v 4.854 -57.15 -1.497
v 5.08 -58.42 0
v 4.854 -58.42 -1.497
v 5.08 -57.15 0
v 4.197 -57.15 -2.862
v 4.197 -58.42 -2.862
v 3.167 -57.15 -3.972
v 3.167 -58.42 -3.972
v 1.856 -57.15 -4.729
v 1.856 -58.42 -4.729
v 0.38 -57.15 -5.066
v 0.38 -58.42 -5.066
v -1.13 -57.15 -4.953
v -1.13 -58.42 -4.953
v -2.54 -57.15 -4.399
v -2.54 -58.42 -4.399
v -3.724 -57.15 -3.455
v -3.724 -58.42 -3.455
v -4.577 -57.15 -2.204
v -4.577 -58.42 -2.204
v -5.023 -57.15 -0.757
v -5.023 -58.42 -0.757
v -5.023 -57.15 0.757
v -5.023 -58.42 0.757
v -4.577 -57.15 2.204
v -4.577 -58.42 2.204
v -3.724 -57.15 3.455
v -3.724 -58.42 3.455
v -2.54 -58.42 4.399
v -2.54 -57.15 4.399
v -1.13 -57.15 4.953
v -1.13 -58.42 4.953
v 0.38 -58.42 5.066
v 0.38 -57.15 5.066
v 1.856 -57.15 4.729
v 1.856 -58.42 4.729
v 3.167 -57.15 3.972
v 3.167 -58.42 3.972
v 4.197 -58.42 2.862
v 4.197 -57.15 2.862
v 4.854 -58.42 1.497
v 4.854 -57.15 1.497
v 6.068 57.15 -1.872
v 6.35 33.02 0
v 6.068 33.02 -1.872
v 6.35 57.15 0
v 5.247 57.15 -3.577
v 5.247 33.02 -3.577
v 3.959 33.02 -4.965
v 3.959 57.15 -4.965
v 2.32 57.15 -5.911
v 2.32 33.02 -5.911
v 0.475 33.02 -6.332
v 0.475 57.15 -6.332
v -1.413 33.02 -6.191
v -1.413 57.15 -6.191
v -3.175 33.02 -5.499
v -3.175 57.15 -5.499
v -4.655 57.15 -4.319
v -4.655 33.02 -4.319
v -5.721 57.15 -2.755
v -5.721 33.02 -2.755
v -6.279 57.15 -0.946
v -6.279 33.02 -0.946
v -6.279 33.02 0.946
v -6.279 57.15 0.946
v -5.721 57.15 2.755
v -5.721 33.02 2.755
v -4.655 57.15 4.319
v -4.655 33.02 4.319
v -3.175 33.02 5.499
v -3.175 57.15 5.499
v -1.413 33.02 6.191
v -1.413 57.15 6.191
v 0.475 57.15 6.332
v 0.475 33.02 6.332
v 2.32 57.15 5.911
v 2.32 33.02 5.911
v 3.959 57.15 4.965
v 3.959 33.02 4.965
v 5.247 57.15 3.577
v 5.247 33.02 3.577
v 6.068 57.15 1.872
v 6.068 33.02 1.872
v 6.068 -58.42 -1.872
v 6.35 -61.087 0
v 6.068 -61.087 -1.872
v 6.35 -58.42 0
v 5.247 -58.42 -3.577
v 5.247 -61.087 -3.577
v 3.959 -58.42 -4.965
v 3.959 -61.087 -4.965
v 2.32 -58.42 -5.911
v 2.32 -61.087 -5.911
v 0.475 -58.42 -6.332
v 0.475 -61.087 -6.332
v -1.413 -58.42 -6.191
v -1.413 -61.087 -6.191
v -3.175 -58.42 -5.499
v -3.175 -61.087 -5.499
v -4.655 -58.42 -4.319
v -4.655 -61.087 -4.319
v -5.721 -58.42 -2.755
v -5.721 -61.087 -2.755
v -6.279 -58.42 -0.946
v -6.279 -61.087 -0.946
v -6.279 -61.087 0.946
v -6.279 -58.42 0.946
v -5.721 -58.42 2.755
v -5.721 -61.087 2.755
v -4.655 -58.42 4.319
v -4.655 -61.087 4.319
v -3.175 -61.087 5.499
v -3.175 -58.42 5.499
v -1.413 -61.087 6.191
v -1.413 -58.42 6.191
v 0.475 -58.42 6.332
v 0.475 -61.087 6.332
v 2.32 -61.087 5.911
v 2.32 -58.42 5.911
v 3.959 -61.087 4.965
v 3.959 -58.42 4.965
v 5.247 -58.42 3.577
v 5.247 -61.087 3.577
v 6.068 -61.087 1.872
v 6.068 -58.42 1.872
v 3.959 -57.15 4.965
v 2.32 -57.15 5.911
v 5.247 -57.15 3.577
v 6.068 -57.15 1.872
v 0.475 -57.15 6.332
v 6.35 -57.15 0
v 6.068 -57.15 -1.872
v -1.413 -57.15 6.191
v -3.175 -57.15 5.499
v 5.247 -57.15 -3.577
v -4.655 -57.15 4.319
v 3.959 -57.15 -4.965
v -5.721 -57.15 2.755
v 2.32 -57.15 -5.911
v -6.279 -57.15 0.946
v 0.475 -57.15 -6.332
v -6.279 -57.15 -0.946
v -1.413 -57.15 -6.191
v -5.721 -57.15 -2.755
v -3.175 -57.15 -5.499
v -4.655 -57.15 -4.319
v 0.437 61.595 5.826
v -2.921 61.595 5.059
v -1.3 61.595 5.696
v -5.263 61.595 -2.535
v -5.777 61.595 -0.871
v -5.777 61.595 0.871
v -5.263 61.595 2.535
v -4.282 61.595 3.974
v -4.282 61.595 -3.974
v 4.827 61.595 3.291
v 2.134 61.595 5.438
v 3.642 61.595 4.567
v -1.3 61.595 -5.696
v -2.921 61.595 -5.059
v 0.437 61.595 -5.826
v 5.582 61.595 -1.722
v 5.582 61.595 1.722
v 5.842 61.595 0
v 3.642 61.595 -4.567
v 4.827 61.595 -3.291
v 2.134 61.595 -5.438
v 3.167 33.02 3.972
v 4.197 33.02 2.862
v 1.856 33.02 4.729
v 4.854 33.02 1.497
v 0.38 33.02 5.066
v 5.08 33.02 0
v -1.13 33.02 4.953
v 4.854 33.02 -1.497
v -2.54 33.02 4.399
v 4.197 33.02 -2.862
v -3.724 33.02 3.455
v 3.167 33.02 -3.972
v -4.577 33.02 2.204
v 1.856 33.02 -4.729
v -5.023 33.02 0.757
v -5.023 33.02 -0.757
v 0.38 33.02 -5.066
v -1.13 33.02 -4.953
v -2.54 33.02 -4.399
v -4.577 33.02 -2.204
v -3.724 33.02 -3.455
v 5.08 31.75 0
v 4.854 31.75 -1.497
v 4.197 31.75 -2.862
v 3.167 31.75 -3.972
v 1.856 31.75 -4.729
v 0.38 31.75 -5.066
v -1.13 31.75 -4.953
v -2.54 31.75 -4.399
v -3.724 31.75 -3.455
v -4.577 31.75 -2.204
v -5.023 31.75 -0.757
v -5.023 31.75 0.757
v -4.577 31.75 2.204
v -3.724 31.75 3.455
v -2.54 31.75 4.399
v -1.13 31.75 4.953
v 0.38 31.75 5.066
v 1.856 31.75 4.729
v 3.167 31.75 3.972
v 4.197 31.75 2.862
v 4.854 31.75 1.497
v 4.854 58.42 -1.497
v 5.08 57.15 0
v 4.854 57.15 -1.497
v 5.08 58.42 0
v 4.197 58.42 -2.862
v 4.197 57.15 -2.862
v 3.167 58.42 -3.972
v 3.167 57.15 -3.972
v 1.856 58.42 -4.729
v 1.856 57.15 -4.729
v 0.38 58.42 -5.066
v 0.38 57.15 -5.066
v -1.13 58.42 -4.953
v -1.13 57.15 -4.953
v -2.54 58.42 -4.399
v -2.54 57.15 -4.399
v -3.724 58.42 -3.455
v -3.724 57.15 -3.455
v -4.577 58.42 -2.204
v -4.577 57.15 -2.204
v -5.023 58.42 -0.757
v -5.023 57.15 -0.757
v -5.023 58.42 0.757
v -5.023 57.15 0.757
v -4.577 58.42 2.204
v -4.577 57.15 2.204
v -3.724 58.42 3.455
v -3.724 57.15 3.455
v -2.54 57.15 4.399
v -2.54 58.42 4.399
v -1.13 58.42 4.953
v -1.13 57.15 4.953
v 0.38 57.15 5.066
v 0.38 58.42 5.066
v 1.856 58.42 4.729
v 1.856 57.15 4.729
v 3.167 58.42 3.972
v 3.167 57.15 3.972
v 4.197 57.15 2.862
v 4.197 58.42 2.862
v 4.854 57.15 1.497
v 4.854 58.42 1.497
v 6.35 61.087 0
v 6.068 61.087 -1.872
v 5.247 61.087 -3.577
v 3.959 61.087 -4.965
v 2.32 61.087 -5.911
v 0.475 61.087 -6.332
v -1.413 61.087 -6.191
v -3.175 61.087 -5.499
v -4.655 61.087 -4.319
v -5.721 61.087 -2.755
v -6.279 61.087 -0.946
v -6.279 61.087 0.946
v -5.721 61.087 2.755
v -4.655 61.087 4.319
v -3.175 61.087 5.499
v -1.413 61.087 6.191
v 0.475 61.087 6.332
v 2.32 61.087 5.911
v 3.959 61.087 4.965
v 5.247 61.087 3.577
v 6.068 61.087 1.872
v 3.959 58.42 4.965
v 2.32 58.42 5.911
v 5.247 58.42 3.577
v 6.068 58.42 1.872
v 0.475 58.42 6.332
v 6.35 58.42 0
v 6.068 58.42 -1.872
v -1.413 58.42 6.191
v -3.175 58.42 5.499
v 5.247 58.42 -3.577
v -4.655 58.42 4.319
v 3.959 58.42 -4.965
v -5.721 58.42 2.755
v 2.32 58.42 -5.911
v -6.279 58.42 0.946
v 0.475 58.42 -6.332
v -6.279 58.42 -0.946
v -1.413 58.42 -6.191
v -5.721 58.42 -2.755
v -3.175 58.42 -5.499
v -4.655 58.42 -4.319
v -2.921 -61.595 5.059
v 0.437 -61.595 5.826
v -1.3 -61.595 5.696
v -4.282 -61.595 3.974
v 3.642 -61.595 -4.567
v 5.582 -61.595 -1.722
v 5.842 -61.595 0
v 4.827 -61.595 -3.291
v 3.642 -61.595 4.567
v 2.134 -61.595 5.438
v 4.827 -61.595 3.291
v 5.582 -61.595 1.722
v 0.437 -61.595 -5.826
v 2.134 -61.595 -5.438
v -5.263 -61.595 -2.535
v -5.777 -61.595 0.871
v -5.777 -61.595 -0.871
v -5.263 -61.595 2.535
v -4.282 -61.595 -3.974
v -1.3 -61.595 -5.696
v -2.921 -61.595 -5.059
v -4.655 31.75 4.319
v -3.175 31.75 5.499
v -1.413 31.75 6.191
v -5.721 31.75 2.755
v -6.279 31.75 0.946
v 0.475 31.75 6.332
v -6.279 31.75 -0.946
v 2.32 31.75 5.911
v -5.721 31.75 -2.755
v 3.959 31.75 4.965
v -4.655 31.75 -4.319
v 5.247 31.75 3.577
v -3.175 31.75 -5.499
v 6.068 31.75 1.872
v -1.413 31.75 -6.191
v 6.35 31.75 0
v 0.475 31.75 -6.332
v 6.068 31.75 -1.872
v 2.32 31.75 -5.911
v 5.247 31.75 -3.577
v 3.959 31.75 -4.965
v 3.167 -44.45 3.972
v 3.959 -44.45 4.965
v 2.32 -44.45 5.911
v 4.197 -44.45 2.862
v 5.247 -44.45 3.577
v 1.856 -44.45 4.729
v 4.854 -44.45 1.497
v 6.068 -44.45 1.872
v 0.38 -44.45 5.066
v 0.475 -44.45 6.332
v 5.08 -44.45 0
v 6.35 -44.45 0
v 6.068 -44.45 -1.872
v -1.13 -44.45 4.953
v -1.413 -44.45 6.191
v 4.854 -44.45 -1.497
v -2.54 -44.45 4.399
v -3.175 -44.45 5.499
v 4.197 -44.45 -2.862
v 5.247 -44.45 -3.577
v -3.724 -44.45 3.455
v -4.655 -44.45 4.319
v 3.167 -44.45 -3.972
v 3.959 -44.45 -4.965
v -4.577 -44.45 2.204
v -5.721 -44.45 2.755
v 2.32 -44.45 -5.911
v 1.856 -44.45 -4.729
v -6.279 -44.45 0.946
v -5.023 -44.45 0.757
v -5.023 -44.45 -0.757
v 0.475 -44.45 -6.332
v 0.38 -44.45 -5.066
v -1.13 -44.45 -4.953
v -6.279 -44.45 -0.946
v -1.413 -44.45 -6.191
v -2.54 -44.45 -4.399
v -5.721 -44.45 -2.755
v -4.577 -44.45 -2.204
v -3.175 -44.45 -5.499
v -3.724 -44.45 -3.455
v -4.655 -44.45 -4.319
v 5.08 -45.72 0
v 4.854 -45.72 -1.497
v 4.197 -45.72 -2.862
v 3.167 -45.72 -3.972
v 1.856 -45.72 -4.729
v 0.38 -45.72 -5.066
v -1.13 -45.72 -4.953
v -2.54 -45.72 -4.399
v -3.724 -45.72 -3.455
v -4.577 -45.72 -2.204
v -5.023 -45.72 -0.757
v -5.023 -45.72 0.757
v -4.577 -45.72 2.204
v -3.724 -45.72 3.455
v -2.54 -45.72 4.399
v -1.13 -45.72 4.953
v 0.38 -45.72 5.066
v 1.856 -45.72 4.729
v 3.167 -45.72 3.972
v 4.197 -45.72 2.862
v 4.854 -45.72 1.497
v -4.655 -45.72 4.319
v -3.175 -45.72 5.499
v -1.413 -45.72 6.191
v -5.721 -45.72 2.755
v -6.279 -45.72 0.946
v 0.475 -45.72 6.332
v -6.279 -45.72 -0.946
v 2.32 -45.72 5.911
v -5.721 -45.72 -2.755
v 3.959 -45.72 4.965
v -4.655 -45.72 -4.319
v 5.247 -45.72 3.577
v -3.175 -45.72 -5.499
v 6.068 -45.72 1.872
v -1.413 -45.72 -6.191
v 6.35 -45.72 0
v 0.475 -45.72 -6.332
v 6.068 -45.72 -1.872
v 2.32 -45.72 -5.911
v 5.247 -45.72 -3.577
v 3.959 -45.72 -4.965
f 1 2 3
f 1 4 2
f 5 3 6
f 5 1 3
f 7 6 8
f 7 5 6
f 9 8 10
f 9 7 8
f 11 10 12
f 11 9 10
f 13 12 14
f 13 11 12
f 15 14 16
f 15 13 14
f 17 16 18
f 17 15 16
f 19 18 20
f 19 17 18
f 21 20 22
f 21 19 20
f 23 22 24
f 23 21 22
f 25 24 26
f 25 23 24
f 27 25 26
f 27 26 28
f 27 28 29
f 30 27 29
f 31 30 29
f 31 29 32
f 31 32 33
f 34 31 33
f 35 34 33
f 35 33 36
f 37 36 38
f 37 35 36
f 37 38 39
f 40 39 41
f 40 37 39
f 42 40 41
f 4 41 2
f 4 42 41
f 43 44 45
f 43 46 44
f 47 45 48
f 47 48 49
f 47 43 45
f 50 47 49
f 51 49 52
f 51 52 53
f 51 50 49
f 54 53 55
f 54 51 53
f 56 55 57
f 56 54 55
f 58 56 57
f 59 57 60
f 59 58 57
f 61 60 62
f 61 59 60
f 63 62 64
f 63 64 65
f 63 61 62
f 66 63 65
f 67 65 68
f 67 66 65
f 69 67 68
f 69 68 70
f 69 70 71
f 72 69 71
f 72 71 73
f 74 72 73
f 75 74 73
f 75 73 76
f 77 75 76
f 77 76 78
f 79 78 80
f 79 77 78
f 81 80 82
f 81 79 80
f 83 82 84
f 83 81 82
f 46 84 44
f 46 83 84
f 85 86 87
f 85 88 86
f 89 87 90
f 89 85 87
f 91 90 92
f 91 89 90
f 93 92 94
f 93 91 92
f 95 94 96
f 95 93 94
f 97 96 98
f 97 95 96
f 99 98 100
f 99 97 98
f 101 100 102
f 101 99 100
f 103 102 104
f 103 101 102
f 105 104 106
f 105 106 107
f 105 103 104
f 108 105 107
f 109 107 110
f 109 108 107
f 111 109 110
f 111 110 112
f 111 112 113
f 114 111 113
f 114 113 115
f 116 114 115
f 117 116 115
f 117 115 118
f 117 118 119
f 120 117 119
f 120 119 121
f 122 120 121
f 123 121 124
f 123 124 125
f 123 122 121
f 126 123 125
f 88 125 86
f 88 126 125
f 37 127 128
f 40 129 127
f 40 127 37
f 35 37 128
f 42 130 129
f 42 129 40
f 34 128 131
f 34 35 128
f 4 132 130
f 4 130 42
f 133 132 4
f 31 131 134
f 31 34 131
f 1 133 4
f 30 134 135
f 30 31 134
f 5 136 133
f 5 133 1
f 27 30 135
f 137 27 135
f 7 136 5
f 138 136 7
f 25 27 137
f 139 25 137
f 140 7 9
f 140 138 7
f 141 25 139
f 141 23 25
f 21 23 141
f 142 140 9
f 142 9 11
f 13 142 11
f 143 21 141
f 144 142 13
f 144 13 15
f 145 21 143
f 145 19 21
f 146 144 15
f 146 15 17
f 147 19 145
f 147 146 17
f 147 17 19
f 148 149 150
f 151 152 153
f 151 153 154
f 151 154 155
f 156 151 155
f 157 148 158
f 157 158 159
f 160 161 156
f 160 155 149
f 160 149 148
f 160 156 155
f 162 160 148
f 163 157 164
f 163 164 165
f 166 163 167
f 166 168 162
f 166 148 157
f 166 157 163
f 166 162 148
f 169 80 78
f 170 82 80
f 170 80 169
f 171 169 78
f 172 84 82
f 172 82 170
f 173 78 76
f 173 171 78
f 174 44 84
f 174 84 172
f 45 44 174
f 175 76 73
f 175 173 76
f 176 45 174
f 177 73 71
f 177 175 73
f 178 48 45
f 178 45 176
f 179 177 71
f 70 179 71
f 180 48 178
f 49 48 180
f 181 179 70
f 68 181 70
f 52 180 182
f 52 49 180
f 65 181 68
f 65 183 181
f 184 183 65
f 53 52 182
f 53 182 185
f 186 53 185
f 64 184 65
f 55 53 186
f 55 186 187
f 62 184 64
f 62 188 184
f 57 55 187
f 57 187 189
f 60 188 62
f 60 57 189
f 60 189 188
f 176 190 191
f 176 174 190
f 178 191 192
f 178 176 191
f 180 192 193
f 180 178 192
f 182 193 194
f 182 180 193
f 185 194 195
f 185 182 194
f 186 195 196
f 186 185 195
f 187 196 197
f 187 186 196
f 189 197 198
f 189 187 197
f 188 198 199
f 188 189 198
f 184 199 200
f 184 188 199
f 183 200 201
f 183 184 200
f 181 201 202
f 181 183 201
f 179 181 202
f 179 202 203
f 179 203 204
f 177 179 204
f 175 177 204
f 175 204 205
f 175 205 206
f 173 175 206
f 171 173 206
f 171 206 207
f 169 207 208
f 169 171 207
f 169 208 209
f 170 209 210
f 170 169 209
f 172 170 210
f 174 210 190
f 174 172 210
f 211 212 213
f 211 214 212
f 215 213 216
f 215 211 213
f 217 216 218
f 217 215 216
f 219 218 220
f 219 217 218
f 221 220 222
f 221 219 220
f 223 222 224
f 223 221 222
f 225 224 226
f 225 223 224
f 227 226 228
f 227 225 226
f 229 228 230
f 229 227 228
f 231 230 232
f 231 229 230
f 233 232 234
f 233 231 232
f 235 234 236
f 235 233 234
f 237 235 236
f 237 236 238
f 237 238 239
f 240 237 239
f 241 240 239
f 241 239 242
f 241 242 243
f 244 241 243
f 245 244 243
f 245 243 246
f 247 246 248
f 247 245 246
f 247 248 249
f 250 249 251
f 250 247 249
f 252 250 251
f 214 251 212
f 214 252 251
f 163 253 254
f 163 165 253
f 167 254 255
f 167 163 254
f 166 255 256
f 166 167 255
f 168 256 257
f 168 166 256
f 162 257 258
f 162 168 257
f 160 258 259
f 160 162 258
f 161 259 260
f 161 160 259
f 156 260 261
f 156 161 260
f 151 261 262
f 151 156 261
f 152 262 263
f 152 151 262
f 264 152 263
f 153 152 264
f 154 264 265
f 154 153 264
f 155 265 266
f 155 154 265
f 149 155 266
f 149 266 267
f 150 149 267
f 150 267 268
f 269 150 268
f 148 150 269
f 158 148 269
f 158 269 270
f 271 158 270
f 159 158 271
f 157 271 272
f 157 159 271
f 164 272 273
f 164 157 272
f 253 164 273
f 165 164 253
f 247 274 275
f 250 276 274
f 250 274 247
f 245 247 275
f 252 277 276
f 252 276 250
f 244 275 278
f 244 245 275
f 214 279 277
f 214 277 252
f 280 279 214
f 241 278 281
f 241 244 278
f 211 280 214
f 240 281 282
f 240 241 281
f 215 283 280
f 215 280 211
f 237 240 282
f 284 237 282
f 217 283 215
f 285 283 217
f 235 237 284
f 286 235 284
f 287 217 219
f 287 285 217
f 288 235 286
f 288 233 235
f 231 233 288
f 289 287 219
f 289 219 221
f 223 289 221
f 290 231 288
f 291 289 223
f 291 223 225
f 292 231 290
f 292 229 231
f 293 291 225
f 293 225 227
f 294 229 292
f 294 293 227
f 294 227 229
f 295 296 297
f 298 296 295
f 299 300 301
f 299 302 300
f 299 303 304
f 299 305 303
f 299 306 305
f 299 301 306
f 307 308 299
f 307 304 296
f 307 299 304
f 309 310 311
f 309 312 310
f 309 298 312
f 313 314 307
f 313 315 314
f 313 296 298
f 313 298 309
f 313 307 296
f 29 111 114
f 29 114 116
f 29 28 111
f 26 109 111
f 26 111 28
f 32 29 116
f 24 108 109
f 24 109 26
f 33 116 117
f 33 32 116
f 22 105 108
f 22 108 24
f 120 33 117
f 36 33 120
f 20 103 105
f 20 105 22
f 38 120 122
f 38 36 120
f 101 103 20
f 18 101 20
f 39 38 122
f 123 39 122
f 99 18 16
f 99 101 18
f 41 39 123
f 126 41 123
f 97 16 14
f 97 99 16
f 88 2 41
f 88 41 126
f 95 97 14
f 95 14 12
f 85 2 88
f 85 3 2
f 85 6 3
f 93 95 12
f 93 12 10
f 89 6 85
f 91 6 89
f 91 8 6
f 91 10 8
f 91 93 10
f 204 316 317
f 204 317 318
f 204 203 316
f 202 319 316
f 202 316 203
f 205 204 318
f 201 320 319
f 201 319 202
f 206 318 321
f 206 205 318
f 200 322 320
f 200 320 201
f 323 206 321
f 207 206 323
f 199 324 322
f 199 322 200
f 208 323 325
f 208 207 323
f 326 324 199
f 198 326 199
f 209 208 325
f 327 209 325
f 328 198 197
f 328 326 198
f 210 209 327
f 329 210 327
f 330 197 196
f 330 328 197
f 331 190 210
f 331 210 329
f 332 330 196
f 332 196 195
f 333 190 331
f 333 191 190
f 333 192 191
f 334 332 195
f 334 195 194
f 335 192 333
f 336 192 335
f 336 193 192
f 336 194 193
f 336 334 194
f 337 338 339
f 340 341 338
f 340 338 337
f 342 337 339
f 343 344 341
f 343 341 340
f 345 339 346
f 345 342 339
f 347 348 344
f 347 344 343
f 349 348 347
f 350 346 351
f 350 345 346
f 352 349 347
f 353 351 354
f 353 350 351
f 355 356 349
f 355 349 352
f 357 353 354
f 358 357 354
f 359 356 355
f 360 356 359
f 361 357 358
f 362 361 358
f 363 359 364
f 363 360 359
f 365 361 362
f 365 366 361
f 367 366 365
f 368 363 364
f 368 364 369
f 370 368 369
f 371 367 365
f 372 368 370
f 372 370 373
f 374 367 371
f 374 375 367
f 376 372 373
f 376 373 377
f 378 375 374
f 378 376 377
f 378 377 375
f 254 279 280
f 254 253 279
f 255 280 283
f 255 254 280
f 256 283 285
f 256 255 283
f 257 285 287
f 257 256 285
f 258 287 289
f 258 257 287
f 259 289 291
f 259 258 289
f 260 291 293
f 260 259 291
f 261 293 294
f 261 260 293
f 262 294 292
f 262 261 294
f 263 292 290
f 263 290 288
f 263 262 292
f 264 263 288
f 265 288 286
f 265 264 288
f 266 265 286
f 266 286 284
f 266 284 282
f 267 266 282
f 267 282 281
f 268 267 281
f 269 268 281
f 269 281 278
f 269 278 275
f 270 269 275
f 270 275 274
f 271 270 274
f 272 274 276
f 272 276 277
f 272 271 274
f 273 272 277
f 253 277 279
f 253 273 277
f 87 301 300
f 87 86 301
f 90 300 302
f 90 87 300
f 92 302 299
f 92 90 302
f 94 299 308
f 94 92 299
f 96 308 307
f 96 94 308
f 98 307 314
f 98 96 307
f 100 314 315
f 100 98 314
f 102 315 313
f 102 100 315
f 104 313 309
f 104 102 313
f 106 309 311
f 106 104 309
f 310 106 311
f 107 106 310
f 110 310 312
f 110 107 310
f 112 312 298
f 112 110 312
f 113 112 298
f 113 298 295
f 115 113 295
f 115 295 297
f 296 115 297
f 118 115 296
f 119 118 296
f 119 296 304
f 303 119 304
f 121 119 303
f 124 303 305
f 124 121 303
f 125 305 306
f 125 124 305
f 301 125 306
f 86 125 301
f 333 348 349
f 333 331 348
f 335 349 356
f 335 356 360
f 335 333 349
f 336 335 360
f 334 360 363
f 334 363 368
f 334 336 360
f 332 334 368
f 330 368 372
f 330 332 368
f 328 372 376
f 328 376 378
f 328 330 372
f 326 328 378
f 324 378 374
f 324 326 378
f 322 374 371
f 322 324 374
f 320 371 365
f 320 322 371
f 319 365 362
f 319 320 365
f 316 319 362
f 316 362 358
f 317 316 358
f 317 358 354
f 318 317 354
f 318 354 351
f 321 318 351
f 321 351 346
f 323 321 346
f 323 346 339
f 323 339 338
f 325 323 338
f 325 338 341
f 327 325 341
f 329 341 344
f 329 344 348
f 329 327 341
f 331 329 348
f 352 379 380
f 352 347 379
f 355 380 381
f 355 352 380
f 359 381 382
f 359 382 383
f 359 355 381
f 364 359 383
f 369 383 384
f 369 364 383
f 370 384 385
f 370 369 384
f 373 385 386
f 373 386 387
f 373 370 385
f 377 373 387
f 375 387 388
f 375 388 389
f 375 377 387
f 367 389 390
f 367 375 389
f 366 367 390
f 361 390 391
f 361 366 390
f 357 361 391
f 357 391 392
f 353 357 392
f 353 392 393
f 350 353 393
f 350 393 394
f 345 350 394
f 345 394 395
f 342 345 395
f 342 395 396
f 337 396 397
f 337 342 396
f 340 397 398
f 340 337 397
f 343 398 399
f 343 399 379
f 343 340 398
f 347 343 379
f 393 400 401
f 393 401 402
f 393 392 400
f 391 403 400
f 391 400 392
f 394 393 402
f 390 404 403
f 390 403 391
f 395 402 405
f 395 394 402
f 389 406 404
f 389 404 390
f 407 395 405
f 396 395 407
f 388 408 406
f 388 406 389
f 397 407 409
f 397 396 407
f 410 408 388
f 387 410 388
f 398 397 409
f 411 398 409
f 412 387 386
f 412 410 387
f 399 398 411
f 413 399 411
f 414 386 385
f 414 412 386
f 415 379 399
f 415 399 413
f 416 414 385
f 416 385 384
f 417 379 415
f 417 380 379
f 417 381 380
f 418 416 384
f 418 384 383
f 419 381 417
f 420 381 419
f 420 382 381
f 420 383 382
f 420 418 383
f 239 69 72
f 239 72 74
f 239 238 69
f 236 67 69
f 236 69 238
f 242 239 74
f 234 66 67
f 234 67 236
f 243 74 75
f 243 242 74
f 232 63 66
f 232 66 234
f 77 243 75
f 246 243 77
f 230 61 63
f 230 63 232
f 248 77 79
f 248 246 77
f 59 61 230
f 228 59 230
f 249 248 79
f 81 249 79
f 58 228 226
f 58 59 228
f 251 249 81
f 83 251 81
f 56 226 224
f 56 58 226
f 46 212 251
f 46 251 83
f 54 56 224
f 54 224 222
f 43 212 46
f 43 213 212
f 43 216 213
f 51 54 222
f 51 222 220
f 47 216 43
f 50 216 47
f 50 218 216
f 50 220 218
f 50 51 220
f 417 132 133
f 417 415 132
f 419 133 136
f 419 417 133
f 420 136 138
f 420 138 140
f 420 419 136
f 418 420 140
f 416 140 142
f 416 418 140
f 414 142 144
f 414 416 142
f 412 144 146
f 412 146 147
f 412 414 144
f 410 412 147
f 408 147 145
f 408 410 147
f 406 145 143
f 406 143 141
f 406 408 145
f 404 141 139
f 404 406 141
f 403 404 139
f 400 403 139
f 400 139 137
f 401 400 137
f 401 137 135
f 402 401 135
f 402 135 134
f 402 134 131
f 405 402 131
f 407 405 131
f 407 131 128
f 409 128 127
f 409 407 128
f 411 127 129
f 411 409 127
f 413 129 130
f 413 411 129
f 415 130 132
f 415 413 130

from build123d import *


with BuildPart() as part:
    # Sketch1 → Revolve1 (revolve)
    with BuildSketch(Plane.XY):
        Polygon((6.35, 61.087), (5.842, 61.595), (0, 61.595), (0, -61.595), (5.842, -61.595), (6.35, -61.087), (6.35, -58.42), (5.08, -58.42), (5.08, -57.15), (6.35, -57.15), (6.35, -45.72), (5.08, -45.72), (5.08, -44.45), (6.35, -44.45), (6.35, 31.75), (5.08, 31.75), (5.08, 33.02), (6.35, 33.02), (6.35, 57.15), (5.08, 57.15), (5.08, 58.42), (6.35, 58.42), align=None)
    revolve(axis=Axis((0, -61.595, 0), (0, 1, 0)))


solid = part.part
